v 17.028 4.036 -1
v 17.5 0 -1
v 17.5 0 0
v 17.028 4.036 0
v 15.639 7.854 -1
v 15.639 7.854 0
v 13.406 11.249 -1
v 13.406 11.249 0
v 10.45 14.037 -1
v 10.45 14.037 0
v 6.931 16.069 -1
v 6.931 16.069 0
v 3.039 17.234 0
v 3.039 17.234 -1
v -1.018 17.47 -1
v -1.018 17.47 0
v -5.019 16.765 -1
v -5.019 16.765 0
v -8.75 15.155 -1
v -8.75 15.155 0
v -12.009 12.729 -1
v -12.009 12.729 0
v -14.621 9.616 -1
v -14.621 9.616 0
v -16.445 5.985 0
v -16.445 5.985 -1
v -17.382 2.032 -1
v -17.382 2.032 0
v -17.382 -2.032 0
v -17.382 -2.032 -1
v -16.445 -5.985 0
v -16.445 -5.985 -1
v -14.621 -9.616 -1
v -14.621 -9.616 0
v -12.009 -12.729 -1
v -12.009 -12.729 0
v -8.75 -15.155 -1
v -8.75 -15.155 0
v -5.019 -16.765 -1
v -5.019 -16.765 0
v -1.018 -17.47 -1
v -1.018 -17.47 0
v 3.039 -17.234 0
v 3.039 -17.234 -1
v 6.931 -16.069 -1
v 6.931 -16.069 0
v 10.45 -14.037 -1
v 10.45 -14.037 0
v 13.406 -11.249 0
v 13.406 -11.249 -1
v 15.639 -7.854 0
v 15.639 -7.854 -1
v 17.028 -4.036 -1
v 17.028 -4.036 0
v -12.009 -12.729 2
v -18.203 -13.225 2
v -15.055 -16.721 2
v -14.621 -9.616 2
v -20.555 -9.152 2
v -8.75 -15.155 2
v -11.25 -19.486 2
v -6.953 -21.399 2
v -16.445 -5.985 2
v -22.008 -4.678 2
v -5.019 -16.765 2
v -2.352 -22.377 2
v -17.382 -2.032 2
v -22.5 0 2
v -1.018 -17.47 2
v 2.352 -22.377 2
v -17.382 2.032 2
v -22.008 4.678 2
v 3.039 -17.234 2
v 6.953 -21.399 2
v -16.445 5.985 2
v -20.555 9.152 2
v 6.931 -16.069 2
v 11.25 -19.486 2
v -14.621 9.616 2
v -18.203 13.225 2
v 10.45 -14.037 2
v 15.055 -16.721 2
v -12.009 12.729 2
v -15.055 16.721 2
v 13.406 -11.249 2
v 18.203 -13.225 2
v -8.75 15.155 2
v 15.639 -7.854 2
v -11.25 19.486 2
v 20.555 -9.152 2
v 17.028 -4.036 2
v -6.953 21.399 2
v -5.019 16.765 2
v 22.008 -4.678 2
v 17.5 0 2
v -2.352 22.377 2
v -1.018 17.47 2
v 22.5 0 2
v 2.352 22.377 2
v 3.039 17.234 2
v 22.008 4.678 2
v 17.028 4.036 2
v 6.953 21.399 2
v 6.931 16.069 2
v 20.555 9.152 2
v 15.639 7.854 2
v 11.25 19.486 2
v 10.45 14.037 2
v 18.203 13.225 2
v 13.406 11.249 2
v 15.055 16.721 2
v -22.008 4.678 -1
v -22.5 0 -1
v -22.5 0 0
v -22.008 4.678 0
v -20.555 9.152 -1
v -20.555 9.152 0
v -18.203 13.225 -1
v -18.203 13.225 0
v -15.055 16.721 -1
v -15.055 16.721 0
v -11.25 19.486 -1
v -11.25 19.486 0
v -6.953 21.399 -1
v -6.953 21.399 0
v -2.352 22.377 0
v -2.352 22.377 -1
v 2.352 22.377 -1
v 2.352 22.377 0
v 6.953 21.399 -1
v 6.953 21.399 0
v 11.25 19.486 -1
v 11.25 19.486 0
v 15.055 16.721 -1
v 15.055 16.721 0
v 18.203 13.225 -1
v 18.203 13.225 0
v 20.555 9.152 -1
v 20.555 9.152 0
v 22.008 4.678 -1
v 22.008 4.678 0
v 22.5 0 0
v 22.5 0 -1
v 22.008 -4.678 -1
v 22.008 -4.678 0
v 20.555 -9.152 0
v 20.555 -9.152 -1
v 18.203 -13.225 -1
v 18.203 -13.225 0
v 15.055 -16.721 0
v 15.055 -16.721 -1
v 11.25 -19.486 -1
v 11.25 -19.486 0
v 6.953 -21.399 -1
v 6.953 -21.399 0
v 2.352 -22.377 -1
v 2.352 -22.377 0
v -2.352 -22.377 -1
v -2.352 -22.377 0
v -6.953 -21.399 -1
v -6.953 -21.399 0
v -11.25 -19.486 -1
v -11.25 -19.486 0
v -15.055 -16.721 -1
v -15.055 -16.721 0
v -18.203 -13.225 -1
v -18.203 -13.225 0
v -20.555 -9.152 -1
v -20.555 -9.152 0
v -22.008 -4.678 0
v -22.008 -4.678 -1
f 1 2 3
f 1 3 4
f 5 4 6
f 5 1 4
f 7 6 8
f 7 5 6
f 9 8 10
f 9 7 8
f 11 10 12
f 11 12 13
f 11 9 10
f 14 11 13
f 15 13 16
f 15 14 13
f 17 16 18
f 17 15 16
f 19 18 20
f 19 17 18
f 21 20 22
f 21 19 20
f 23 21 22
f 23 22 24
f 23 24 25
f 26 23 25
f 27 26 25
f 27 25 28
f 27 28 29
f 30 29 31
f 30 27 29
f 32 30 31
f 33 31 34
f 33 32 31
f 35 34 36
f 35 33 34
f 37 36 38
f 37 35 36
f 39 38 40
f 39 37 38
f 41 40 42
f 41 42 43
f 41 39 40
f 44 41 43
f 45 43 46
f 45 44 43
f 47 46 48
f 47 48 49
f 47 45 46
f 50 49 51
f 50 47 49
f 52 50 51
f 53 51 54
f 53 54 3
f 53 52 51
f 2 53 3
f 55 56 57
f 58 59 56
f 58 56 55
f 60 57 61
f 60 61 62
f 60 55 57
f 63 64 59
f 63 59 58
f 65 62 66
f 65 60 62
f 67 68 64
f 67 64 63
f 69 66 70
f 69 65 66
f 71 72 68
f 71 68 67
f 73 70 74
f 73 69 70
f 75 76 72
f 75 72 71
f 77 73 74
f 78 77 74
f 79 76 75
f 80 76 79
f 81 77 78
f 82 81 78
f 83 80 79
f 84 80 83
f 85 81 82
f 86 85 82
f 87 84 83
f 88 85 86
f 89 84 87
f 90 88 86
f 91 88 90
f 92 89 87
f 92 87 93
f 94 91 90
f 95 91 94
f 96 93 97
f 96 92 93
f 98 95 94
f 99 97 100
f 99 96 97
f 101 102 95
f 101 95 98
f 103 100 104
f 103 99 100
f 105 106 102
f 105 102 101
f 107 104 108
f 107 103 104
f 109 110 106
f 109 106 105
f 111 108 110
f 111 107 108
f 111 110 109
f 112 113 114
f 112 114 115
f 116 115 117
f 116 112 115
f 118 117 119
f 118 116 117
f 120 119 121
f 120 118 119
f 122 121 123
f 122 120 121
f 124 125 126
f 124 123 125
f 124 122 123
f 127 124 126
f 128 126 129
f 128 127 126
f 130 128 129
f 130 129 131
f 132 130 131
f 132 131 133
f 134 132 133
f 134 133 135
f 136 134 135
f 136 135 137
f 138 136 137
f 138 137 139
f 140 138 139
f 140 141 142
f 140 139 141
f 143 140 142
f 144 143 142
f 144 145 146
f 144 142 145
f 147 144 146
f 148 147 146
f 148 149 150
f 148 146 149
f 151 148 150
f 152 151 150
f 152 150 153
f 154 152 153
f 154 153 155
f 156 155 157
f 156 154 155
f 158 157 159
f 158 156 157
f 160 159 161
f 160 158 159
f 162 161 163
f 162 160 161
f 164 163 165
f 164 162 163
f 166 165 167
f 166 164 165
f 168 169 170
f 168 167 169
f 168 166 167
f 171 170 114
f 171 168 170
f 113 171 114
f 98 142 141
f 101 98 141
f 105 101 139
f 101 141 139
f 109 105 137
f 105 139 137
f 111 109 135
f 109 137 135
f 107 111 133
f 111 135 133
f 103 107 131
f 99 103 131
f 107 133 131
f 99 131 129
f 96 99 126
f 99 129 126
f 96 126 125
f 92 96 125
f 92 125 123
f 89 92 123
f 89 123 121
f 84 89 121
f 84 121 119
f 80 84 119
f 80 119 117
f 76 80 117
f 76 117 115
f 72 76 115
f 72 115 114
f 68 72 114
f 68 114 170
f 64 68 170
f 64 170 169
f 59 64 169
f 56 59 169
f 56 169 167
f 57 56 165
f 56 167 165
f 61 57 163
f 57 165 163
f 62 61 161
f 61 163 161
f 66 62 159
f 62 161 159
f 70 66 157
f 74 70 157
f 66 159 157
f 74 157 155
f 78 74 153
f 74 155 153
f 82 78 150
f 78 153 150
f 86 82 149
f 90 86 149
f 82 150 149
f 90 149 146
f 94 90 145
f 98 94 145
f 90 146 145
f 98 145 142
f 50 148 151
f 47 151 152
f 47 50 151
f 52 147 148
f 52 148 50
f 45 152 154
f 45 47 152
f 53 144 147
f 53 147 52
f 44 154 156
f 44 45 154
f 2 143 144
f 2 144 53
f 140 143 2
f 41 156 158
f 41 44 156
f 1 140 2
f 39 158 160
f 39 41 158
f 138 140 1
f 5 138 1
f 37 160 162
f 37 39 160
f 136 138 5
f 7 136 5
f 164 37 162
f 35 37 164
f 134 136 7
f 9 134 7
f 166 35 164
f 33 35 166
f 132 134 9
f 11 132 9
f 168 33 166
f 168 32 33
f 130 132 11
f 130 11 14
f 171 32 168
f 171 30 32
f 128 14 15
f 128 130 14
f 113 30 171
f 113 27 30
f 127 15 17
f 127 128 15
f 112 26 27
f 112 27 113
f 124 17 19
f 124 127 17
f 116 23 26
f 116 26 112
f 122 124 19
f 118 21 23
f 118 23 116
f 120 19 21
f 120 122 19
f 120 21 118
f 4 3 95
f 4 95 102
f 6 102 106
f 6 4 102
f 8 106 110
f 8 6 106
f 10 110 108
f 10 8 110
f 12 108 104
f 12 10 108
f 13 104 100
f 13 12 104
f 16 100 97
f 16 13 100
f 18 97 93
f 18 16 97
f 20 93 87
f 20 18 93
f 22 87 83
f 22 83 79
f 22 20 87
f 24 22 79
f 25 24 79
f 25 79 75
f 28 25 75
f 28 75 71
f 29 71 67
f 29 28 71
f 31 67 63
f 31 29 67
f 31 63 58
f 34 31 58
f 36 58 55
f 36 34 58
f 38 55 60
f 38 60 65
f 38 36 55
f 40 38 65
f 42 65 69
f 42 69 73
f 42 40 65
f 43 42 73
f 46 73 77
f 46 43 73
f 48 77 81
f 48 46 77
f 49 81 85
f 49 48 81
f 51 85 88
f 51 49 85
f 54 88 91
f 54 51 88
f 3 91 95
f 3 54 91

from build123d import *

# Parameters (mm, degrees)
SKETCH1_R           = 22.5
SKETCH1_R_2         = 17.5
BOSS_EXTRUDE1_DEPTH = 2
BOSS_EXTRUDE2_START = 1
SKETCH2_R           = 22.5
BOSS_EXTRUDE2_DEPTH = 1
CUT_EXTRUDE1_START  = -1
SKETCH3_R           = 17.5
CUT_EXTRUDE1_DEPTH  = 1


with BuildPart() as part:
    # Sketch1 → Boss-Extrude1 (new body)
    with BuildSketch(Plane.XY):
        Circle(SKETCH1_R)
        Circle(SKETCH1_R_2, mode=Mode.SUBTRACT)
    extrude(amount=BOSS_EXTRUDE1_DEPTH)

    # Sketch2 → Boss-Extrude2 (add)
    with BuildSketch(Plane(origin=(0, 0, 0), x_dir=(-1, 0, 0), z_dir=(0, 0, -1)).offset(BOSS_EXTRUDE2_START)):
        Circle(SKETCH2_R)
    extrude(amount=-BOSS_EXTRUDE2_DEPTH)

    # Sketch3 → Cut-Extrude1 (cut)
    with BuildSketch(Plane.XY.offset(CUT_EXTRUDE1_START)):
        Circle(SKETCH3_R)
    extrude(amount=CUT_EXTRUDE1_DEPTH, mode=Mode.SUBTRACT)


solid = part.part
